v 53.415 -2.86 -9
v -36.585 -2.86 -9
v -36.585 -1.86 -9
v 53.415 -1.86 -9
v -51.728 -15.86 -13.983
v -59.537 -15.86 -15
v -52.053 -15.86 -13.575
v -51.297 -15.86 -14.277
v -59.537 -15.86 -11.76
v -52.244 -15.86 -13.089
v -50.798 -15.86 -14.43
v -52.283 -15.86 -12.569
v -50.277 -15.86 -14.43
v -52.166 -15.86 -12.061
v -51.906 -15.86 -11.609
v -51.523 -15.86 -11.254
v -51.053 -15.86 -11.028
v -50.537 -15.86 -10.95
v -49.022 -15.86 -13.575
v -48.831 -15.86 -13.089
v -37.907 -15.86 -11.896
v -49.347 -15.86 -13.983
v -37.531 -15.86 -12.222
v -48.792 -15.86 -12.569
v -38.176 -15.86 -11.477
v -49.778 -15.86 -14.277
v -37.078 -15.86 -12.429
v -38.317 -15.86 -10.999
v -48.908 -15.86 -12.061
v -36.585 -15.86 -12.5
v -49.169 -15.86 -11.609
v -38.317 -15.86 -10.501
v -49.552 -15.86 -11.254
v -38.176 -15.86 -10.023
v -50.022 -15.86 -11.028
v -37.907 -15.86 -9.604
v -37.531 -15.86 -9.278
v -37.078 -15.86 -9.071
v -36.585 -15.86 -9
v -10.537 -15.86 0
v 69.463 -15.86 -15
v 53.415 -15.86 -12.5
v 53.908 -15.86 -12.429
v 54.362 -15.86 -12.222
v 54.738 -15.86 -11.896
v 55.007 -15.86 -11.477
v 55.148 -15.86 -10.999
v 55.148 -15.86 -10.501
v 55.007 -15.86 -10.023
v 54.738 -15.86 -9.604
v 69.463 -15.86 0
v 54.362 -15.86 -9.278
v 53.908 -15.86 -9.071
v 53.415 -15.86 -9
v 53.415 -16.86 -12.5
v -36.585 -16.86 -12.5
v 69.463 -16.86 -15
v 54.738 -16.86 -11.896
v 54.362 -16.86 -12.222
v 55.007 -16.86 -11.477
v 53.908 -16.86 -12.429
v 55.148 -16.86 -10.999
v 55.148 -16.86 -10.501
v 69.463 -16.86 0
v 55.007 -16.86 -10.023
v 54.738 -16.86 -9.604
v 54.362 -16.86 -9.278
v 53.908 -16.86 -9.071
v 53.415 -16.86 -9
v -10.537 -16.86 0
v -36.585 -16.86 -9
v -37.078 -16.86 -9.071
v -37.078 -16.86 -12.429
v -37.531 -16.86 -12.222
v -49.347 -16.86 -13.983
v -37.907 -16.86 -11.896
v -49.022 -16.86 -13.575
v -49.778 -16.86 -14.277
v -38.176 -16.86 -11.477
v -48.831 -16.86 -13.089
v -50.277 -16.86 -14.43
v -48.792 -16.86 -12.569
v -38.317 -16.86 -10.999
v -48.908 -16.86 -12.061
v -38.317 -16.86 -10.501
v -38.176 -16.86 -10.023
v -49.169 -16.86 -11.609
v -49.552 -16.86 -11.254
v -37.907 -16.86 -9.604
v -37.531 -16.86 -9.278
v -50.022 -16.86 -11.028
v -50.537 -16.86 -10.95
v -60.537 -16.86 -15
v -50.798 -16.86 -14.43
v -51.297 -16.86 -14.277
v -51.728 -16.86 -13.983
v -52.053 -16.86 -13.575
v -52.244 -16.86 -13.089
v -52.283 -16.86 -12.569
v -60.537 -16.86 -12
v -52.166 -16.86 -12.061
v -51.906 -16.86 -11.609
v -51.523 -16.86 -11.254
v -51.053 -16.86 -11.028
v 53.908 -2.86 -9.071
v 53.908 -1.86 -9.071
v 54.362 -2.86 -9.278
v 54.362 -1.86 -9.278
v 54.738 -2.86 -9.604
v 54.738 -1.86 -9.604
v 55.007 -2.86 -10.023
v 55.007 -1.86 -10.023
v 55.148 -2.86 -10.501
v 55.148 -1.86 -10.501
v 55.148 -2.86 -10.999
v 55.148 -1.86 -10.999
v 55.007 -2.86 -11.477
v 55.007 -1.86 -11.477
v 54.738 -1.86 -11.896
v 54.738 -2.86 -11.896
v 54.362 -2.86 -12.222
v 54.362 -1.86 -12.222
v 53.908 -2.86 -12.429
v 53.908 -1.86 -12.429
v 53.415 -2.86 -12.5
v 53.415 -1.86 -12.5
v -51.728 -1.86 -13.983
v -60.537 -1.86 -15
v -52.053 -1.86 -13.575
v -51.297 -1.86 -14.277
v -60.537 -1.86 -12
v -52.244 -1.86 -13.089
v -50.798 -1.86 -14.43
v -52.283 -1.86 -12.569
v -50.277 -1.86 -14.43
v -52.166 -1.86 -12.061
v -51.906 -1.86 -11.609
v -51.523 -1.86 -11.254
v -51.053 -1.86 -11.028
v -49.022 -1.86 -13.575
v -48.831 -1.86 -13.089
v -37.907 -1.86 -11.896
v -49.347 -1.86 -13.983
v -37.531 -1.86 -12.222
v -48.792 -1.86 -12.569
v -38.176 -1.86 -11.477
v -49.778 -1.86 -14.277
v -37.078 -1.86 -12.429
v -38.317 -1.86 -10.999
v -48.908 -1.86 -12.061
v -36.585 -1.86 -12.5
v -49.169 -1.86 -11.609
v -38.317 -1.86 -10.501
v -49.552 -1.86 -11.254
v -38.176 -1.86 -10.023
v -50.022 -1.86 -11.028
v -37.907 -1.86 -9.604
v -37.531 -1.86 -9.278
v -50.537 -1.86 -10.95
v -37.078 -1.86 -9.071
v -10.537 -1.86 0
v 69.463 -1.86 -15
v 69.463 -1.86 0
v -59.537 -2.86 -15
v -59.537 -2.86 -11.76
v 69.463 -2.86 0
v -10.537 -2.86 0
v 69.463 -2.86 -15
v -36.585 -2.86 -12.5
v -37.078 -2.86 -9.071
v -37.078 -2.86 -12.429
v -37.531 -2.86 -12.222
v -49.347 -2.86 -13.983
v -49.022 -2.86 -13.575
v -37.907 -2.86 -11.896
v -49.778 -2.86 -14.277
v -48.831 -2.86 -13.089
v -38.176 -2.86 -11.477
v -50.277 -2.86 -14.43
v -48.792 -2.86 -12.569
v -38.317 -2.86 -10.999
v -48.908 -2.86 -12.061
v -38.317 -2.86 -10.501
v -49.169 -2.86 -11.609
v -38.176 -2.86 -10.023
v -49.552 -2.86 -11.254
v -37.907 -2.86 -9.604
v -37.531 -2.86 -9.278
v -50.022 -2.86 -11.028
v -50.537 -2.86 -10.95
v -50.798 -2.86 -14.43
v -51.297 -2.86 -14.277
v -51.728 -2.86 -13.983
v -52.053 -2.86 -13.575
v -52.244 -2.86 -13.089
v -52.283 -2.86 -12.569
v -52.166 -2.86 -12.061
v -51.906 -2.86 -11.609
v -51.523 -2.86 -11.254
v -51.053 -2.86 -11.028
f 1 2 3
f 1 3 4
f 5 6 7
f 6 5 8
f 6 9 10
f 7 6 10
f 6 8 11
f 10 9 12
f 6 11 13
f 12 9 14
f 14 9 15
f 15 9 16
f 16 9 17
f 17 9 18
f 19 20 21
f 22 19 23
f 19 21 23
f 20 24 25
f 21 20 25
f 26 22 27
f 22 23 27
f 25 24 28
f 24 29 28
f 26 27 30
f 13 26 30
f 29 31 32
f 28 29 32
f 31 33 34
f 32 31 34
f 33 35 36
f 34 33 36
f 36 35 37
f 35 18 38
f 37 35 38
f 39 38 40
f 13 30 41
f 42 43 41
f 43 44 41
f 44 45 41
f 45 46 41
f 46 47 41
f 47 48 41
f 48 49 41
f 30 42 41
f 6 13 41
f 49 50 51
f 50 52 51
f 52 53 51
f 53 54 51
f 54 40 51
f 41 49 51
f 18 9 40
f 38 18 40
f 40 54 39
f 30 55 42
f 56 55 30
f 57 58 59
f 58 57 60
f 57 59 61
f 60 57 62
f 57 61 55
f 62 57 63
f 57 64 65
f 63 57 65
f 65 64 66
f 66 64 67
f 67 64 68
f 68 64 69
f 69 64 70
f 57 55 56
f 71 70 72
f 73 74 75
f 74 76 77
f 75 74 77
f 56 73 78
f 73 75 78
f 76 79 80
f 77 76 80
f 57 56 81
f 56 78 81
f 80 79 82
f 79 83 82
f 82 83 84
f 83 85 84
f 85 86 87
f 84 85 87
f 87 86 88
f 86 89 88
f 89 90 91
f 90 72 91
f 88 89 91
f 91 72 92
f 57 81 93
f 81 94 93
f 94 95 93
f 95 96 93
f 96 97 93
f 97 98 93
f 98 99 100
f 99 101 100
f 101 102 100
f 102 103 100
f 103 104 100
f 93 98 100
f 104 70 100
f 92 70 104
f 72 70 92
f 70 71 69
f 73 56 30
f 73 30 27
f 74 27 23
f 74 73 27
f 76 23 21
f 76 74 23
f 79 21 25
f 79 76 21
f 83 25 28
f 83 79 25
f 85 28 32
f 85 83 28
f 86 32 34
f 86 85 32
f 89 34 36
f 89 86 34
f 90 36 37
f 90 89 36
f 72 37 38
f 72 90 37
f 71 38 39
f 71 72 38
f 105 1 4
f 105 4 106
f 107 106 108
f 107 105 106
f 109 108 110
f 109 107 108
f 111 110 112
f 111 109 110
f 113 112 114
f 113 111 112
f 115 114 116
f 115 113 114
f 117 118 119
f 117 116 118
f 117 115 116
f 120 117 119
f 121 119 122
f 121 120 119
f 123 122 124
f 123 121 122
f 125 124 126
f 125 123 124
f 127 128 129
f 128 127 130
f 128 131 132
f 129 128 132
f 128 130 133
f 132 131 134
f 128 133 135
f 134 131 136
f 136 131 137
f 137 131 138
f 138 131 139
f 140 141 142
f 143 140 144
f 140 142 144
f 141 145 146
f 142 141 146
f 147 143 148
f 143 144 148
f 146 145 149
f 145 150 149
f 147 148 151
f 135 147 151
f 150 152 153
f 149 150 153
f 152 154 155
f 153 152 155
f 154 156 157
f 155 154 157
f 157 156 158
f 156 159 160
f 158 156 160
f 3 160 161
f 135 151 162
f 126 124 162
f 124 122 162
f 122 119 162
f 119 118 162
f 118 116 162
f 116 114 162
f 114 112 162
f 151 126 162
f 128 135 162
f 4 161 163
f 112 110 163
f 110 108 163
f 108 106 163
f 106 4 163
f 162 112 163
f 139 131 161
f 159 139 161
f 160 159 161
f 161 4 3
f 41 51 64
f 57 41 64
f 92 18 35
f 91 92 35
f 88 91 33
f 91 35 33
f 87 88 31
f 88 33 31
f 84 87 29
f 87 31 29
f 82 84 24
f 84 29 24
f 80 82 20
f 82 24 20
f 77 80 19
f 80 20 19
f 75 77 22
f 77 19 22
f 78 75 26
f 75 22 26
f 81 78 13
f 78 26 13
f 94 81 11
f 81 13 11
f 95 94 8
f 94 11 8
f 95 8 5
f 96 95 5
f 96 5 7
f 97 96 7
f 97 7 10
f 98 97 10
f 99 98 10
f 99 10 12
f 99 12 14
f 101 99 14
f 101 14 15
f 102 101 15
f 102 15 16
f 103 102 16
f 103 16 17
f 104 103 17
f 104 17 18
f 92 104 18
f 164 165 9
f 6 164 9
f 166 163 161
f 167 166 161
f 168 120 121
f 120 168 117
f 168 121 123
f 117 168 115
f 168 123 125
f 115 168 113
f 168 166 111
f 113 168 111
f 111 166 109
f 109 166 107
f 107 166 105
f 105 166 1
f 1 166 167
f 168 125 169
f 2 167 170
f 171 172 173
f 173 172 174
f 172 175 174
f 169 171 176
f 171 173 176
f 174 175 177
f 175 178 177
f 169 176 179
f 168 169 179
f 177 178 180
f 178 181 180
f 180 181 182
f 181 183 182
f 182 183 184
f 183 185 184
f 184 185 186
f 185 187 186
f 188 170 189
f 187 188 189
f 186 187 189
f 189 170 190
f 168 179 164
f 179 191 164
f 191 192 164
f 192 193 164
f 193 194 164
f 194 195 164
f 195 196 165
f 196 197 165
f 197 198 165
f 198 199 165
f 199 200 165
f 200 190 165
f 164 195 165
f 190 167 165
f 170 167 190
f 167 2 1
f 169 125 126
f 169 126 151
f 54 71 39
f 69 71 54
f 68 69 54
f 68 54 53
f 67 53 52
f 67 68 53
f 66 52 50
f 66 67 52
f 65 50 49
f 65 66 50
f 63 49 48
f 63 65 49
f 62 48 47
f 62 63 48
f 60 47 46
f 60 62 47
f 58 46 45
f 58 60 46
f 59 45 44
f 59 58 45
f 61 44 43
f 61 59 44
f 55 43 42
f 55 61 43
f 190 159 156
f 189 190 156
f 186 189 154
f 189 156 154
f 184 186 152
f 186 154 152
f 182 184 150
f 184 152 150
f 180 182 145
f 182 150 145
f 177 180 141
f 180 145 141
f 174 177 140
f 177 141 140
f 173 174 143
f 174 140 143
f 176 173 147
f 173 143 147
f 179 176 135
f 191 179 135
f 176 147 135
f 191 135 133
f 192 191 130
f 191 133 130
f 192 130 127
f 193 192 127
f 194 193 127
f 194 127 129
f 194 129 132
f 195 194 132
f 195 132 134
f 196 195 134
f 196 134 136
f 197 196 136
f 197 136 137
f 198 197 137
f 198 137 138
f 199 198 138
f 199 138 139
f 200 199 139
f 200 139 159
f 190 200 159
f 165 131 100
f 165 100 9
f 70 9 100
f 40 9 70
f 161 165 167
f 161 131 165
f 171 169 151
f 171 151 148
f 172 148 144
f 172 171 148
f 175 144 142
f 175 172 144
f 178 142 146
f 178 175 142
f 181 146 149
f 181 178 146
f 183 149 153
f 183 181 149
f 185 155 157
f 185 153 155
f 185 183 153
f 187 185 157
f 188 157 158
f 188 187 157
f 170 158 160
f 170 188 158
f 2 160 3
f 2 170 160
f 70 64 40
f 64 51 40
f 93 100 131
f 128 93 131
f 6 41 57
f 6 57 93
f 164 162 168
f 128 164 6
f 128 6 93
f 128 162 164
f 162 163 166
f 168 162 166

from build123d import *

# Parameters (mm, degrees)
BOSS_EXTRUDE1_DEPTH = 15
CUT_EXTRUDE1_DEPTH  = 73.629551255
SKETCH8_R           = 1.75
CUT_EXTRUDE2_DEPTH  = 73.629551255
CUT_EXTRUDE4_DEPTH  = 73.629551255


with BuildPart() as part:
    # Sketch3 → Boss-Extrude1 (new body)
    with BuildSketch(Plane.XY):
        Polygon((-60.537407798, -1.859852476), (69.462592202, -1.859852476), (69.462592202, -2.859852476), (-59.537407798, -2.859852476), (-59.537407798, -15.859852476), (69.462592202, -15.859852476), (69.462592202, -16.859852476), (-60.537407798, -16.859852476), align=None)
    extrude(amount=-BOSS_EXTRUDE1_DEPTH)

    # Sketch6 → Cut-Extrude1 (cut, through all)
    with BuildSketch(Plane(origin=(0, -1.859852476, 0), x_dir=(1, 0, 0), z_dir=(0, 1, 0))):
        Polygon((-60.537407798, 12), (-10.537407798, 0), (-10.537407798, -10.064923469), (-60.537407798, -10.064923469), align=None)
    extrude(amount=-CUT_EXTRUDE1_DEPTH, mode=Mode.SUBTRACT)

    # Sketch8 → Cut-Extrude2 (cut, through all)
    with BuildSketch(Plane(origin=(0, -1.859852476, 0), x_dir=(1, 0, 0), z_dir=(0, 1, 0))):
        with Locations(Location((-50.537407798, 12.7, 0), (0, 0, 270))):
            Circle(SKETCH8_R)
    extrude(amount=-CUT_EXTRUDE2_DEPTH, mode=Mode.SUBTRACT)

    # Sketch12 → Cut-Extrude4 (cut, through all)
    with BuildSketch(Plane.XZ.offset(16.859852476)):
        with BuildLine():
            Line((53.415401878, -12.5), (-36.584598122, -12.5))
            ThreePointArc((-36.584598122, -12.5), (-38.334598122, -10.75), (-36.584598122, -9))
            Line((-36.584598122, -9), (53.415401878, -9))
            ThreePointArc((53.415401878, -9), (55.165401878, -10.75), (53.415401878, -12.5))
        make_face()
    extrude(amount=-CUT_EXTRUDE4_DEPTH, mode=Mode.SUBTRACT)


solid = part.part
